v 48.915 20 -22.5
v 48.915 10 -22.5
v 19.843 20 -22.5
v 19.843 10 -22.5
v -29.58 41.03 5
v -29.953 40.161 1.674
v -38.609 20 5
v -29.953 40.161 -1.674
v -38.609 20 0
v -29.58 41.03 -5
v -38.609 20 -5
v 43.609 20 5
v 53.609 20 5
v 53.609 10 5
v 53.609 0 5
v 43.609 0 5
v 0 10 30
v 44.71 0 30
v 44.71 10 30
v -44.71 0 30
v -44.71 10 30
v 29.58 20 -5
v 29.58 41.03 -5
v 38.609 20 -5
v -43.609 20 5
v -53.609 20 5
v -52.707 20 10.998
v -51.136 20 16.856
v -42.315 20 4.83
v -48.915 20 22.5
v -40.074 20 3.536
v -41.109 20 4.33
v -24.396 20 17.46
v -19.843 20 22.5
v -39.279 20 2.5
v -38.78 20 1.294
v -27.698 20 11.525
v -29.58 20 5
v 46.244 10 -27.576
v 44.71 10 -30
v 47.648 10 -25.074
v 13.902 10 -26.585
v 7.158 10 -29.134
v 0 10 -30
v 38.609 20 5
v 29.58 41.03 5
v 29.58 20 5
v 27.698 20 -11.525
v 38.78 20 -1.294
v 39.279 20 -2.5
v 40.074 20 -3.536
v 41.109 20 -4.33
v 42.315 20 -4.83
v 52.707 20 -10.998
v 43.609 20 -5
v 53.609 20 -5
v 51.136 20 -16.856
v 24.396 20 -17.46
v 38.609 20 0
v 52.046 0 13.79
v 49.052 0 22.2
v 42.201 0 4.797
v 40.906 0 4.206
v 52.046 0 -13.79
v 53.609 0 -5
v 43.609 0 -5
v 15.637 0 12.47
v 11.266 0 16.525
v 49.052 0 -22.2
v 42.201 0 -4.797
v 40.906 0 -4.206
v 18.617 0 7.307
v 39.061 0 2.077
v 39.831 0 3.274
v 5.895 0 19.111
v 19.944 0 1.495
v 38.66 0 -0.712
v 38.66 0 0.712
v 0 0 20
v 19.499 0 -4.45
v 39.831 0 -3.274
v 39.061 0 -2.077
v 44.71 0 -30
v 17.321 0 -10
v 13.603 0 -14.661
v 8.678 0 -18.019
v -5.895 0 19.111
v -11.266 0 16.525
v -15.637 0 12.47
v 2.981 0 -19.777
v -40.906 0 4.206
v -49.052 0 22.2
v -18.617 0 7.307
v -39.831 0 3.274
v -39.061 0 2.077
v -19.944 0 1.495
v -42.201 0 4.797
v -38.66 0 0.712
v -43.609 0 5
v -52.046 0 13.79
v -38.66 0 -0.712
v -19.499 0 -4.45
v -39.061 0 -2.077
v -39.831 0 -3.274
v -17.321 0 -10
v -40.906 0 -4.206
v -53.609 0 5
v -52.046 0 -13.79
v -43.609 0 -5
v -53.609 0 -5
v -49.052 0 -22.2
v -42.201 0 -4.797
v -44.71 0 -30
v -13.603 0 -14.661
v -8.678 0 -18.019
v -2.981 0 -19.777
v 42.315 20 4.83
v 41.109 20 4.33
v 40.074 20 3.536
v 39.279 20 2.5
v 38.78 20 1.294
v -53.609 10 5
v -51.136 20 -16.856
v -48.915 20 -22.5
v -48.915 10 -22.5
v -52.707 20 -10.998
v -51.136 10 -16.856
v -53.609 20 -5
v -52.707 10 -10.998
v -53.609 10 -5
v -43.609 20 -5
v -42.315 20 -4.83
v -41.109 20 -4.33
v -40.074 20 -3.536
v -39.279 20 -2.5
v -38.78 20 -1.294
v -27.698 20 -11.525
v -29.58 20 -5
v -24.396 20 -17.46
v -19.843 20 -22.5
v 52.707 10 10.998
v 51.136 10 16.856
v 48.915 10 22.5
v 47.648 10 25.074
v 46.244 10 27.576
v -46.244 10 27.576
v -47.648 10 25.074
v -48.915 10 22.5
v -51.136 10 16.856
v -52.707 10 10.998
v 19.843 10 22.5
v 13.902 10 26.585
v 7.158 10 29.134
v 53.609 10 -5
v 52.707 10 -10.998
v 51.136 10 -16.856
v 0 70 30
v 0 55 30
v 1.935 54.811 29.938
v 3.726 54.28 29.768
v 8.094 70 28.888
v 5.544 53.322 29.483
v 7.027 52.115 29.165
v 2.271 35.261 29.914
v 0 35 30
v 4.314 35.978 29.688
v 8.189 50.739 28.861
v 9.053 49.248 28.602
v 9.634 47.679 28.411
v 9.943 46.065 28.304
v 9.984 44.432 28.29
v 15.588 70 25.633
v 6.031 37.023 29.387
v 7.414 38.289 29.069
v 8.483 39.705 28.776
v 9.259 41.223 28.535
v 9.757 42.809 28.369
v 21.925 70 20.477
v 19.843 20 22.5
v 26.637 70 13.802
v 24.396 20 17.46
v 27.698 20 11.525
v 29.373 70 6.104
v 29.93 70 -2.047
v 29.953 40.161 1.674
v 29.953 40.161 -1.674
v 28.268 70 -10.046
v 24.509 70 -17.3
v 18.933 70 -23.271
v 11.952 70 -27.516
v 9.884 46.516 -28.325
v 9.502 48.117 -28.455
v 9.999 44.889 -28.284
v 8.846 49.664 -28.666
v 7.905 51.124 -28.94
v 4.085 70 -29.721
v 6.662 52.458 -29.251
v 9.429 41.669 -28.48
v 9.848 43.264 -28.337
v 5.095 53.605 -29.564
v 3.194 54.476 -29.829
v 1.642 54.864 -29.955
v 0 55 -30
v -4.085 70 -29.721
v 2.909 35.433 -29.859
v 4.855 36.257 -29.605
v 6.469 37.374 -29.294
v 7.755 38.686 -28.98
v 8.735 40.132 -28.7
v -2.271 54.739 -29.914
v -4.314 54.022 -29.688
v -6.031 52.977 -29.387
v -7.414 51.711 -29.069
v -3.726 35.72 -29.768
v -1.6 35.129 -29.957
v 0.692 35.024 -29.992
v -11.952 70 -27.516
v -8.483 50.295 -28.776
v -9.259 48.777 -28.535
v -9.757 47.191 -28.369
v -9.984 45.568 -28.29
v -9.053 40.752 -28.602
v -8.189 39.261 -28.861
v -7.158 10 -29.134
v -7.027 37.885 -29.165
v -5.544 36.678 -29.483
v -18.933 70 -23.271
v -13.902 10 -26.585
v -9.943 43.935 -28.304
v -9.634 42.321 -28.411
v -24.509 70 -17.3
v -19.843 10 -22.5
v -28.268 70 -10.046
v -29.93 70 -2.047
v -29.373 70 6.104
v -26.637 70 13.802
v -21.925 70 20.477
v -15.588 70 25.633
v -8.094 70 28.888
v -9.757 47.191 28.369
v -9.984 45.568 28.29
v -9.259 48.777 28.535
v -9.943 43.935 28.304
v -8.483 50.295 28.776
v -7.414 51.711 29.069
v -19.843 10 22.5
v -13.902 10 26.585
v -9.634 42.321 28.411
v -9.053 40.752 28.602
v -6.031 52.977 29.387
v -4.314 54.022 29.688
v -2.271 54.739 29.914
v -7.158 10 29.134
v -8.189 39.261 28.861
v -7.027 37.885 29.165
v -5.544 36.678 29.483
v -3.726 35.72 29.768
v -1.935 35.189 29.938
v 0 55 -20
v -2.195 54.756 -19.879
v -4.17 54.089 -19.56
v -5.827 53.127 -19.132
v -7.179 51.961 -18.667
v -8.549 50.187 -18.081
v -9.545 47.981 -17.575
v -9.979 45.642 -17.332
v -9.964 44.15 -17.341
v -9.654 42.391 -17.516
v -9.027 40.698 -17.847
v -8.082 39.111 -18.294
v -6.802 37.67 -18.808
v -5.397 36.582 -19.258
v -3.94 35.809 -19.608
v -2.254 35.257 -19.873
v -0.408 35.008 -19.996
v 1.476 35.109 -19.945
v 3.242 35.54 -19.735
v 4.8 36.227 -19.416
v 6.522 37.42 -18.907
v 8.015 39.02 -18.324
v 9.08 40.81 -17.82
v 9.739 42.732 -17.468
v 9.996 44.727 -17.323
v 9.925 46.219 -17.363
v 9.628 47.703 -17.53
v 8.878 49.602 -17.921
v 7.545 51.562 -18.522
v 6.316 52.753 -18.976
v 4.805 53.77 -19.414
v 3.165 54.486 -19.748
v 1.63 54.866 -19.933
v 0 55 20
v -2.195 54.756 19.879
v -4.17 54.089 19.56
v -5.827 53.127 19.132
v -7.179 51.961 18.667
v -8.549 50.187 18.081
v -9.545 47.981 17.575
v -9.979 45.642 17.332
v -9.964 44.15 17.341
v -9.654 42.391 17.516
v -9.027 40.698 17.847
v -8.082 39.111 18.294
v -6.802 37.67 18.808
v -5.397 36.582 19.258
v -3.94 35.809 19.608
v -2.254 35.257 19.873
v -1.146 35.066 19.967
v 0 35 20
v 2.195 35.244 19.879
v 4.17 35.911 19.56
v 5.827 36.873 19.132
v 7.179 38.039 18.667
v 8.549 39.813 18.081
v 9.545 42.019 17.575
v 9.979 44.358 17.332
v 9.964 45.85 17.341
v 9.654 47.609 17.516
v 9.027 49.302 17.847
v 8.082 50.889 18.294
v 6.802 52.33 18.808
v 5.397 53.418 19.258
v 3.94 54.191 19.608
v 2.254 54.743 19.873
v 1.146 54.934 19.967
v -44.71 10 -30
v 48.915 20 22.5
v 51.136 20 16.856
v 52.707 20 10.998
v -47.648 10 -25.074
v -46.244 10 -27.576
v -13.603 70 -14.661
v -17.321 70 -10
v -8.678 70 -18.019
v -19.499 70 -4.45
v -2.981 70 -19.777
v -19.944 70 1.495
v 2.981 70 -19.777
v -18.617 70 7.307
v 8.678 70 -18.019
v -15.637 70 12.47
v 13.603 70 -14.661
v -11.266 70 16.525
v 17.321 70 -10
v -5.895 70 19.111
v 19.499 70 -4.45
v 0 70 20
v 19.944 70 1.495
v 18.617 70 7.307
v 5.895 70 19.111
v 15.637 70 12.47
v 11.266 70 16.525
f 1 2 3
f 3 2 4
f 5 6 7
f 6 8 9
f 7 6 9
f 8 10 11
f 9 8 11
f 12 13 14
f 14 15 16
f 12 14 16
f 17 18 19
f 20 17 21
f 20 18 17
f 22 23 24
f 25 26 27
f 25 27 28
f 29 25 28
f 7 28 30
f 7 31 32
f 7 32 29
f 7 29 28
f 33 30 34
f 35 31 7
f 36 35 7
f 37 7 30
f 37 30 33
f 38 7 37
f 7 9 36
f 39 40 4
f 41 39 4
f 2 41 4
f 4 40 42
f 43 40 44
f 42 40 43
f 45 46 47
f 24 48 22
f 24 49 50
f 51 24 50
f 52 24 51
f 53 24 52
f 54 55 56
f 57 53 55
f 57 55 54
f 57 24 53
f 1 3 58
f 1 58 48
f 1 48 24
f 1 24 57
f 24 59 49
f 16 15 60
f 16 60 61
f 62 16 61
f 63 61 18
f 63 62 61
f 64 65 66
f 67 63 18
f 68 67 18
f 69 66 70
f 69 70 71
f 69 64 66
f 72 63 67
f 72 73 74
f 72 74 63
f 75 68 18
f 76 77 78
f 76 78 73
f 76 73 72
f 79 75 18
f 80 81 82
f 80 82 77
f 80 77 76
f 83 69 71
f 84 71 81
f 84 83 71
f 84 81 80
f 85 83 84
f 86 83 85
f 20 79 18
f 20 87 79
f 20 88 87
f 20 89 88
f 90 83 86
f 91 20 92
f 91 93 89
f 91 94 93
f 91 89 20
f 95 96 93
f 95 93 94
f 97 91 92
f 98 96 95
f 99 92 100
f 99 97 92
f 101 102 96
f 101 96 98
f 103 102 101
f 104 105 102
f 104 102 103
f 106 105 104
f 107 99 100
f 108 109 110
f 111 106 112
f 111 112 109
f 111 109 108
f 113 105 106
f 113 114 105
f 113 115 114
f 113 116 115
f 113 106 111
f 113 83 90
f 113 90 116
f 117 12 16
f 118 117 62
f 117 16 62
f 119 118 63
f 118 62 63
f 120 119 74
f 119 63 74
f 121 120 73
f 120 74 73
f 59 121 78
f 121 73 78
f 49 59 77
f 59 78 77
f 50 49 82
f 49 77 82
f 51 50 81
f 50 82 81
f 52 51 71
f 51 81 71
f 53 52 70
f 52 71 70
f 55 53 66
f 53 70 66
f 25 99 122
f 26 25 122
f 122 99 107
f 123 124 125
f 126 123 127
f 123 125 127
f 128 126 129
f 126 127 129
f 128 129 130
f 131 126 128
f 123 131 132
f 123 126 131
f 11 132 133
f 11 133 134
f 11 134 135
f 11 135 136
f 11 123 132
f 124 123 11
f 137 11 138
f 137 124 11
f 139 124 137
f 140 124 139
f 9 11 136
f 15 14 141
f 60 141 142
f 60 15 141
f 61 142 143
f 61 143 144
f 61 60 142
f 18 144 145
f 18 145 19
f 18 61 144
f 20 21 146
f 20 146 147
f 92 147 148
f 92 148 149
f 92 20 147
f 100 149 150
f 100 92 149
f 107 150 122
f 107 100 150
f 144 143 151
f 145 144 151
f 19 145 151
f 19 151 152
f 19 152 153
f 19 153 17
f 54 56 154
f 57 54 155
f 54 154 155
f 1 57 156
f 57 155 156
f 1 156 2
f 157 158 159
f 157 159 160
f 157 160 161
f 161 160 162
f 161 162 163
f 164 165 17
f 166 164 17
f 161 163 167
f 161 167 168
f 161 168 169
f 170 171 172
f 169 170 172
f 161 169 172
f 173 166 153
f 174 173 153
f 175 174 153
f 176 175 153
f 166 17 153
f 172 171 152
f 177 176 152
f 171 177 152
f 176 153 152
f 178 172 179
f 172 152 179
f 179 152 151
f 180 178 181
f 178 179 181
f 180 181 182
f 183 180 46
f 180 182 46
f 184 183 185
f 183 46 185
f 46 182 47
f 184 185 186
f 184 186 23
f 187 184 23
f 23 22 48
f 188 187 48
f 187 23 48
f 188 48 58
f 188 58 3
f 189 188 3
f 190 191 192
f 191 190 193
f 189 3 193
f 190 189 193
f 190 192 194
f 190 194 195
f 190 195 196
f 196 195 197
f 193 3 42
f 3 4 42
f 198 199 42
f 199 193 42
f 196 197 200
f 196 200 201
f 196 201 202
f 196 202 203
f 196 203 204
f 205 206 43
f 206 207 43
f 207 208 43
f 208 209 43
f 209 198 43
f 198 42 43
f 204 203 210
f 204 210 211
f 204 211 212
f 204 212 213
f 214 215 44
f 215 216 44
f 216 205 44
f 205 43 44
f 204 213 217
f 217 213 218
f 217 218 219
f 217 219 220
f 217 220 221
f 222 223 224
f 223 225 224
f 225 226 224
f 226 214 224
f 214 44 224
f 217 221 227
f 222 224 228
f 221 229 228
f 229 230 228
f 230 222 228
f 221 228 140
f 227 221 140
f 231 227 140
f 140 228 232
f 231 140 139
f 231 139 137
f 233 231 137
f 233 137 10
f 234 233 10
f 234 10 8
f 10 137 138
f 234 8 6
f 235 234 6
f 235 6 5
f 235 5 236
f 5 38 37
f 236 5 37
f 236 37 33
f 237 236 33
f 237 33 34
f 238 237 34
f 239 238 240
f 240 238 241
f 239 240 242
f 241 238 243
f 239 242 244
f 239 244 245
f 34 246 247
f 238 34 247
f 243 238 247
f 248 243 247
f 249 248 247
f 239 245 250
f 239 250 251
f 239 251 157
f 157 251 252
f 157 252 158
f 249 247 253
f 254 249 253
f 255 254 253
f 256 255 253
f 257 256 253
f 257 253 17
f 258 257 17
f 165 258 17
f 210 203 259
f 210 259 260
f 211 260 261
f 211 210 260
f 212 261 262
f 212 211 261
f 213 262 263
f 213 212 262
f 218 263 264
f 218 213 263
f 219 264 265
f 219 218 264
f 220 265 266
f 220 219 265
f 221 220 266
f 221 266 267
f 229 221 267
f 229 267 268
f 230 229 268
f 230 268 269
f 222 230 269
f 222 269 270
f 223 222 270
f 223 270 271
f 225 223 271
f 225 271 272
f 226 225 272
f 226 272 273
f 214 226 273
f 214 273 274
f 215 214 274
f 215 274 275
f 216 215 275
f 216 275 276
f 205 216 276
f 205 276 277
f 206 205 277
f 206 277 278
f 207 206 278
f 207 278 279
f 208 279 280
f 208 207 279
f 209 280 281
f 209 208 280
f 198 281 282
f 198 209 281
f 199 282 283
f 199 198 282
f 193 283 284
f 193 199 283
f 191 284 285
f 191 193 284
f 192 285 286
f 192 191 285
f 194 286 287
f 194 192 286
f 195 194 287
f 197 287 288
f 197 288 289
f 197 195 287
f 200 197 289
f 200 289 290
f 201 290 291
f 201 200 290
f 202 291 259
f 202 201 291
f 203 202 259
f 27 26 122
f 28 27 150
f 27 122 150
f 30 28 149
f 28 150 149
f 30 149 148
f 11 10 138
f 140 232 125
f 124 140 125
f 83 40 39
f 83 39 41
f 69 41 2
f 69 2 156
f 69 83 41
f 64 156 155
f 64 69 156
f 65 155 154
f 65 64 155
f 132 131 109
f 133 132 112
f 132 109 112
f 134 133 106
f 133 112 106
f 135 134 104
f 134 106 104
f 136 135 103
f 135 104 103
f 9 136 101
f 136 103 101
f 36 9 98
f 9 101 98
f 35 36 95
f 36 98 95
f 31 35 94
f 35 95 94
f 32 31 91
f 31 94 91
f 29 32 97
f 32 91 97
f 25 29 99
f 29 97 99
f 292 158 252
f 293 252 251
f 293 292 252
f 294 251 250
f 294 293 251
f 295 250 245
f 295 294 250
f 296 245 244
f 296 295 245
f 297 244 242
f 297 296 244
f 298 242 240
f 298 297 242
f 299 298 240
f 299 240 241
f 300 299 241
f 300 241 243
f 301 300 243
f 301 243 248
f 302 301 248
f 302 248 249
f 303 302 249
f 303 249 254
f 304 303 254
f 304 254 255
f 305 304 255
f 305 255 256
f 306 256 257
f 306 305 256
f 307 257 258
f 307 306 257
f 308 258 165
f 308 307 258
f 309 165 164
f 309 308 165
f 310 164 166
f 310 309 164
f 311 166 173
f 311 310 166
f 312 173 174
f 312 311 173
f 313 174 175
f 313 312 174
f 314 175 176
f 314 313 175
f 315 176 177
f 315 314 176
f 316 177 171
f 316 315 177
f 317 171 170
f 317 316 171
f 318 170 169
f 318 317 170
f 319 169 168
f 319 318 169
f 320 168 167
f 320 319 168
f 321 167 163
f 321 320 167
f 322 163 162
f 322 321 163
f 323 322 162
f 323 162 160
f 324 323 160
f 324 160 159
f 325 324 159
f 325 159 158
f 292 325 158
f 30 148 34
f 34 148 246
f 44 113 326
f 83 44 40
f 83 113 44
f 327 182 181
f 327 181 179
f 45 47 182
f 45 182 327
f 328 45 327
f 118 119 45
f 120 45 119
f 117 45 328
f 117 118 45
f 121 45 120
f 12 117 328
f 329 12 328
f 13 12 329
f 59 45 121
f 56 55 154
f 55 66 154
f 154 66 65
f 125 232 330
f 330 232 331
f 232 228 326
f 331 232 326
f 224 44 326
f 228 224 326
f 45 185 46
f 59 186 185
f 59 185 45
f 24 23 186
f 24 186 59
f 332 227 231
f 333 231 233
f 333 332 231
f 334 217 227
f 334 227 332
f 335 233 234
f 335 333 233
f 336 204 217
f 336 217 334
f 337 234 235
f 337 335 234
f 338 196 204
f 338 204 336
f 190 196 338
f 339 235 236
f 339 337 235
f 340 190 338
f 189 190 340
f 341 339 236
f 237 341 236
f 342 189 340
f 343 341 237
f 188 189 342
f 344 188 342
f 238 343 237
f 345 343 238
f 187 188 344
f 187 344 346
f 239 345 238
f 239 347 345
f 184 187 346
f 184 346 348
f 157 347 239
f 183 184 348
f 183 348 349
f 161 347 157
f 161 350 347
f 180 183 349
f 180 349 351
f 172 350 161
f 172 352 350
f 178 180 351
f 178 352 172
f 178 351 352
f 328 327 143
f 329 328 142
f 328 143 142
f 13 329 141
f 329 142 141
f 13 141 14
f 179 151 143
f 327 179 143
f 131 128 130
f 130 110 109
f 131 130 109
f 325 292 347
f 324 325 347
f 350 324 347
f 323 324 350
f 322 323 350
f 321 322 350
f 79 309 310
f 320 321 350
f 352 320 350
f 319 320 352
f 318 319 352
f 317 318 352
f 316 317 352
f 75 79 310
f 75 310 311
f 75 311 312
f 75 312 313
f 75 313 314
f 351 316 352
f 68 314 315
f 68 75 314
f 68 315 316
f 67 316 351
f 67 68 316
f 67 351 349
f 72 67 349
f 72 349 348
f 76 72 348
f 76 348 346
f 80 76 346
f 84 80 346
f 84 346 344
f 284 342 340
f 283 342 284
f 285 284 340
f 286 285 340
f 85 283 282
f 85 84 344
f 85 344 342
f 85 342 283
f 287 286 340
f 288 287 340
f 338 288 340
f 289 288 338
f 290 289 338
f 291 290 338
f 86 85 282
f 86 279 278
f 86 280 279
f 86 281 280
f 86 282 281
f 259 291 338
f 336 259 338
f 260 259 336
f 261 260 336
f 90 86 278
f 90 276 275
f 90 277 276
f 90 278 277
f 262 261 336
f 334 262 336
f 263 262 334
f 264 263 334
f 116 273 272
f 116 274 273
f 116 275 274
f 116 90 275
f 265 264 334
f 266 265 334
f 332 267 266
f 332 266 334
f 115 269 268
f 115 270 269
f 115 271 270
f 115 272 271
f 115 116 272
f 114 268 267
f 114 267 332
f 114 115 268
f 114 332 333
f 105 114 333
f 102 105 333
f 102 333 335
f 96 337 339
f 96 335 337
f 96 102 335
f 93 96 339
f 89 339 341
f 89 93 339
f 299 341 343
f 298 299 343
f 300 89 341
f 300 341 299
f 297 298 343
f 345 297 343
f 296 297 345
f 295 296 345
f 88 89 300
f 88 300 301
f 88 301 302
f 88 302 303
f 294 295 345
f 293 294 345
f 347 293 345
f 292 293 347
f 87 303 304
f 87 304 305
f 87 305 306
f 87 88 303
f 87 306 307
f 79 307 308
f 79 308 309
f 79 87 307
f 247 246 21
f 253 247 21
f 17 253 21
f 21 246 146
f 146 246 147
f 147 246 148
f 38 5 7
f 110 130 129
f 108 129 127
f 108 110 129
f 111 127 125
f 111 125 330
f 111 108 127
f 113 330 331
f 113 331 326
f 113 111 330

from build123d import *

# Parameters (mm, degrees)
EXTRUDE_1_DEPTH          = 10
SKETCH_3_R               = 30
EXTRUDE_2_DEPTH          = 60
CUT_EXTRUDE_START        = -30
SKETCH_4_R               = 10
CUT_EXTRUDE_1_DEPTH      = 60
EXTRUDE_3_DEPTH          = 10
CUT_EXTRUDE_2_DEPTH      = 94.134165377
CUT_EXTRUDE_2_DEPTH_BACK = 94.134165377
SKETCH_8_R               = 20
RIB_2_REACH              = 95.134
SKETCH_9_WALL_W          = 210.033760752
SKETCH_9_WALL_H          = 10


with BuildPart() as part:
    # 草图2 → 凸台-拉伸1 (new body)
    with BuildSketch(Plane(origin=(0, 0, 0), x_dir=(1, 0, 0), z_dir=(0, 1, 0))):
        with BuildLine():
            Line((53.609446504, 5), (43.609446504, 5))
            ThreePointArc((43.609446504, 5), (38.609446504, 0), (43.609446504, -5))
            Line((43.609446504, -5), (53.609446504, -5))
            ThreePointArc((53.609446504, -5), (50.723980057, -18.056871313), (44.709873121, -30))
            Line((44.709873121, -30), (-44.709873121, -30))
            ThreePointArc((-44.709873121, -30), (-50.723980057, -18.056871313), (-53.609446504, -5))
            Line((-53.609446504, -5), (-43.609446504, -5))
            ThreePointArc((-43.609446504, -5), (-38.609446504, 0), (-43.609446504, 5))
            Line((-43.609446504, 5), (-53.609446504, 5))
            ThreePointArc((-53.609446504, 5), (-50.723980057, 18.056871313), (-44.709873121, 30))
            Line((-44.709873121, 30), (44.709873121, 30))
            ThreePointArc((44.709873121, 30), (50.723980057, 18.056871313), (53.609446504, 5))
        make_face()
    extrude(amount=EXTRUDE_1_DEPTH)

    # 草图3 → 凸台-拉伸2 (add)
    with BuildSketch(Plane(origin=(0, 10, 0), x_dir=(1, 0, 0), z_dir=(0, 1, 0))):
        with Locations(Location((0, 0, 0), (0, 0, 270))):
            Circle(SKETCH_3_R)
    extrude(amount=EXTRUDE_2_DEPTH)

    # 草图4 → 切除-拉伸1 (cut)
    with BuildSketch(Plane.XY.offset(CUT_EXTRUDE_START)):
        with Locations(Location((0, 45, 0), (0, 0, 90))):
            Circle(SKETCH_4_R)
    extrude(amount=CUT_EXTRUDE_1_DEPTH, mode=Mode.SUBTRACT)

    # 草图7 → 凸台-拉伸3 (add)
    with BuildSketch(Plane(origin=(0, 10, 0), x_dir=(1, 0, 0), z_dir=(0, 1, 0))):
        with BuildLine():
            Line((-48.915465391, -22.5), (-19.843134833, -22.5))
            ThreePointArc((-19.843134833, -22.5), (-30, 0), (-19.843134833, 22.5))
            Line((-19.843134833, 22.5), (-48.915465391, 22.5))
            ThreePointArc((-48.915465391, 22.5), (-52.003864181, 13.948866071), (-53.609446504, 5))
            Line((-53.609446504, 5), (-43.609446504, 5))
            ThreePointArc((-43.609446504, 5), (-38.609446504, 0), (-43.609446504, -5))
            Line((-43.609446504, -5), (-53.609446504, -5))
            ThreePointArc((-53.609446504, -5), (-52.003864181, -13.948866071), (-48.915465391, -22.5))
        make_face()
        with BuildLine():
            Line((19.843134833, -22.5), (48.915465391, -22.5))
            ThreePointArc((48.915465391, -22.5), (52.003864181, -13.948866071), (53.609446504, -5))
            Line((53.609446504, -5), (43.609446504, -5))
            ThreePointArc((43.609446504, -5), (38.609446504, 0), (43.609446504, 5))
            Line((43.609446504, 5), (53.609446504, 5))
            ThreePointArc((53.609446504, 5), (52.003864181, 13.948866071), (48.915465391, 22.5))
            Line((48.915465391, 22.5), (19.843134833, 22.5))
            ThreePointArc((19.843134833, 22.5), (30, 0), (19.843134833, -22.5))
        make_face()
    extrude(amount=EXTRUDE_3_DEPTH)

    # 草图8 → 切除-拉伸2 (cut, two sides: drawn at the far end of the back side and taken through both)
    with BuildSketch(Plane(origin=(0, 70, 0), x_dir=(1, 0, 0), z_dir=(0, 1, 0)).offset(-CUT_EXTRUDE_2_DEPTH_BACK)):
        with Locations(Location((0, 0, 0), (0, 0, 270))):
            Circle(SKETCH_8_R)
    extrude(amount=CUT_EXTRUDE_2_DEPTH + CUT_EXTRUDE_2_DEPTH_BACK, mode=Mode.SUBTRACT)

    # 草图9 wall → 筋2 (add, up to next)
    with BuildSketch(Plane(origin=(34.316023147, 30, 0), x_dir=(0.394517672004, -0.918888353651, 0), z_dir=(0.918888353651, 0.394517672004, 0)), mode=Mode.PRIVATE) as rib_2_sk1:
        Rectangle(SKETCH_9_WALL_W, SKETCH_9_WALL_H)
    rib_2_tool1 = extrude(rib_2_sk1.sketch, amount=-RIB_2_REACH, mode=Mode.PRIVATE) - part.part
    rib_2 = rib_2_tool1.solids().sort_by_distance((34.316023147, 30, 0))[0]
    add(rib_2)

    # 镜向1: 筋2 across plane
    add(rib_2.mirror(Plane(origin=(0, 0, 0), x_dir=(0, 0, 1), z_dir=(1, 0, 0))))


solid = part.part
